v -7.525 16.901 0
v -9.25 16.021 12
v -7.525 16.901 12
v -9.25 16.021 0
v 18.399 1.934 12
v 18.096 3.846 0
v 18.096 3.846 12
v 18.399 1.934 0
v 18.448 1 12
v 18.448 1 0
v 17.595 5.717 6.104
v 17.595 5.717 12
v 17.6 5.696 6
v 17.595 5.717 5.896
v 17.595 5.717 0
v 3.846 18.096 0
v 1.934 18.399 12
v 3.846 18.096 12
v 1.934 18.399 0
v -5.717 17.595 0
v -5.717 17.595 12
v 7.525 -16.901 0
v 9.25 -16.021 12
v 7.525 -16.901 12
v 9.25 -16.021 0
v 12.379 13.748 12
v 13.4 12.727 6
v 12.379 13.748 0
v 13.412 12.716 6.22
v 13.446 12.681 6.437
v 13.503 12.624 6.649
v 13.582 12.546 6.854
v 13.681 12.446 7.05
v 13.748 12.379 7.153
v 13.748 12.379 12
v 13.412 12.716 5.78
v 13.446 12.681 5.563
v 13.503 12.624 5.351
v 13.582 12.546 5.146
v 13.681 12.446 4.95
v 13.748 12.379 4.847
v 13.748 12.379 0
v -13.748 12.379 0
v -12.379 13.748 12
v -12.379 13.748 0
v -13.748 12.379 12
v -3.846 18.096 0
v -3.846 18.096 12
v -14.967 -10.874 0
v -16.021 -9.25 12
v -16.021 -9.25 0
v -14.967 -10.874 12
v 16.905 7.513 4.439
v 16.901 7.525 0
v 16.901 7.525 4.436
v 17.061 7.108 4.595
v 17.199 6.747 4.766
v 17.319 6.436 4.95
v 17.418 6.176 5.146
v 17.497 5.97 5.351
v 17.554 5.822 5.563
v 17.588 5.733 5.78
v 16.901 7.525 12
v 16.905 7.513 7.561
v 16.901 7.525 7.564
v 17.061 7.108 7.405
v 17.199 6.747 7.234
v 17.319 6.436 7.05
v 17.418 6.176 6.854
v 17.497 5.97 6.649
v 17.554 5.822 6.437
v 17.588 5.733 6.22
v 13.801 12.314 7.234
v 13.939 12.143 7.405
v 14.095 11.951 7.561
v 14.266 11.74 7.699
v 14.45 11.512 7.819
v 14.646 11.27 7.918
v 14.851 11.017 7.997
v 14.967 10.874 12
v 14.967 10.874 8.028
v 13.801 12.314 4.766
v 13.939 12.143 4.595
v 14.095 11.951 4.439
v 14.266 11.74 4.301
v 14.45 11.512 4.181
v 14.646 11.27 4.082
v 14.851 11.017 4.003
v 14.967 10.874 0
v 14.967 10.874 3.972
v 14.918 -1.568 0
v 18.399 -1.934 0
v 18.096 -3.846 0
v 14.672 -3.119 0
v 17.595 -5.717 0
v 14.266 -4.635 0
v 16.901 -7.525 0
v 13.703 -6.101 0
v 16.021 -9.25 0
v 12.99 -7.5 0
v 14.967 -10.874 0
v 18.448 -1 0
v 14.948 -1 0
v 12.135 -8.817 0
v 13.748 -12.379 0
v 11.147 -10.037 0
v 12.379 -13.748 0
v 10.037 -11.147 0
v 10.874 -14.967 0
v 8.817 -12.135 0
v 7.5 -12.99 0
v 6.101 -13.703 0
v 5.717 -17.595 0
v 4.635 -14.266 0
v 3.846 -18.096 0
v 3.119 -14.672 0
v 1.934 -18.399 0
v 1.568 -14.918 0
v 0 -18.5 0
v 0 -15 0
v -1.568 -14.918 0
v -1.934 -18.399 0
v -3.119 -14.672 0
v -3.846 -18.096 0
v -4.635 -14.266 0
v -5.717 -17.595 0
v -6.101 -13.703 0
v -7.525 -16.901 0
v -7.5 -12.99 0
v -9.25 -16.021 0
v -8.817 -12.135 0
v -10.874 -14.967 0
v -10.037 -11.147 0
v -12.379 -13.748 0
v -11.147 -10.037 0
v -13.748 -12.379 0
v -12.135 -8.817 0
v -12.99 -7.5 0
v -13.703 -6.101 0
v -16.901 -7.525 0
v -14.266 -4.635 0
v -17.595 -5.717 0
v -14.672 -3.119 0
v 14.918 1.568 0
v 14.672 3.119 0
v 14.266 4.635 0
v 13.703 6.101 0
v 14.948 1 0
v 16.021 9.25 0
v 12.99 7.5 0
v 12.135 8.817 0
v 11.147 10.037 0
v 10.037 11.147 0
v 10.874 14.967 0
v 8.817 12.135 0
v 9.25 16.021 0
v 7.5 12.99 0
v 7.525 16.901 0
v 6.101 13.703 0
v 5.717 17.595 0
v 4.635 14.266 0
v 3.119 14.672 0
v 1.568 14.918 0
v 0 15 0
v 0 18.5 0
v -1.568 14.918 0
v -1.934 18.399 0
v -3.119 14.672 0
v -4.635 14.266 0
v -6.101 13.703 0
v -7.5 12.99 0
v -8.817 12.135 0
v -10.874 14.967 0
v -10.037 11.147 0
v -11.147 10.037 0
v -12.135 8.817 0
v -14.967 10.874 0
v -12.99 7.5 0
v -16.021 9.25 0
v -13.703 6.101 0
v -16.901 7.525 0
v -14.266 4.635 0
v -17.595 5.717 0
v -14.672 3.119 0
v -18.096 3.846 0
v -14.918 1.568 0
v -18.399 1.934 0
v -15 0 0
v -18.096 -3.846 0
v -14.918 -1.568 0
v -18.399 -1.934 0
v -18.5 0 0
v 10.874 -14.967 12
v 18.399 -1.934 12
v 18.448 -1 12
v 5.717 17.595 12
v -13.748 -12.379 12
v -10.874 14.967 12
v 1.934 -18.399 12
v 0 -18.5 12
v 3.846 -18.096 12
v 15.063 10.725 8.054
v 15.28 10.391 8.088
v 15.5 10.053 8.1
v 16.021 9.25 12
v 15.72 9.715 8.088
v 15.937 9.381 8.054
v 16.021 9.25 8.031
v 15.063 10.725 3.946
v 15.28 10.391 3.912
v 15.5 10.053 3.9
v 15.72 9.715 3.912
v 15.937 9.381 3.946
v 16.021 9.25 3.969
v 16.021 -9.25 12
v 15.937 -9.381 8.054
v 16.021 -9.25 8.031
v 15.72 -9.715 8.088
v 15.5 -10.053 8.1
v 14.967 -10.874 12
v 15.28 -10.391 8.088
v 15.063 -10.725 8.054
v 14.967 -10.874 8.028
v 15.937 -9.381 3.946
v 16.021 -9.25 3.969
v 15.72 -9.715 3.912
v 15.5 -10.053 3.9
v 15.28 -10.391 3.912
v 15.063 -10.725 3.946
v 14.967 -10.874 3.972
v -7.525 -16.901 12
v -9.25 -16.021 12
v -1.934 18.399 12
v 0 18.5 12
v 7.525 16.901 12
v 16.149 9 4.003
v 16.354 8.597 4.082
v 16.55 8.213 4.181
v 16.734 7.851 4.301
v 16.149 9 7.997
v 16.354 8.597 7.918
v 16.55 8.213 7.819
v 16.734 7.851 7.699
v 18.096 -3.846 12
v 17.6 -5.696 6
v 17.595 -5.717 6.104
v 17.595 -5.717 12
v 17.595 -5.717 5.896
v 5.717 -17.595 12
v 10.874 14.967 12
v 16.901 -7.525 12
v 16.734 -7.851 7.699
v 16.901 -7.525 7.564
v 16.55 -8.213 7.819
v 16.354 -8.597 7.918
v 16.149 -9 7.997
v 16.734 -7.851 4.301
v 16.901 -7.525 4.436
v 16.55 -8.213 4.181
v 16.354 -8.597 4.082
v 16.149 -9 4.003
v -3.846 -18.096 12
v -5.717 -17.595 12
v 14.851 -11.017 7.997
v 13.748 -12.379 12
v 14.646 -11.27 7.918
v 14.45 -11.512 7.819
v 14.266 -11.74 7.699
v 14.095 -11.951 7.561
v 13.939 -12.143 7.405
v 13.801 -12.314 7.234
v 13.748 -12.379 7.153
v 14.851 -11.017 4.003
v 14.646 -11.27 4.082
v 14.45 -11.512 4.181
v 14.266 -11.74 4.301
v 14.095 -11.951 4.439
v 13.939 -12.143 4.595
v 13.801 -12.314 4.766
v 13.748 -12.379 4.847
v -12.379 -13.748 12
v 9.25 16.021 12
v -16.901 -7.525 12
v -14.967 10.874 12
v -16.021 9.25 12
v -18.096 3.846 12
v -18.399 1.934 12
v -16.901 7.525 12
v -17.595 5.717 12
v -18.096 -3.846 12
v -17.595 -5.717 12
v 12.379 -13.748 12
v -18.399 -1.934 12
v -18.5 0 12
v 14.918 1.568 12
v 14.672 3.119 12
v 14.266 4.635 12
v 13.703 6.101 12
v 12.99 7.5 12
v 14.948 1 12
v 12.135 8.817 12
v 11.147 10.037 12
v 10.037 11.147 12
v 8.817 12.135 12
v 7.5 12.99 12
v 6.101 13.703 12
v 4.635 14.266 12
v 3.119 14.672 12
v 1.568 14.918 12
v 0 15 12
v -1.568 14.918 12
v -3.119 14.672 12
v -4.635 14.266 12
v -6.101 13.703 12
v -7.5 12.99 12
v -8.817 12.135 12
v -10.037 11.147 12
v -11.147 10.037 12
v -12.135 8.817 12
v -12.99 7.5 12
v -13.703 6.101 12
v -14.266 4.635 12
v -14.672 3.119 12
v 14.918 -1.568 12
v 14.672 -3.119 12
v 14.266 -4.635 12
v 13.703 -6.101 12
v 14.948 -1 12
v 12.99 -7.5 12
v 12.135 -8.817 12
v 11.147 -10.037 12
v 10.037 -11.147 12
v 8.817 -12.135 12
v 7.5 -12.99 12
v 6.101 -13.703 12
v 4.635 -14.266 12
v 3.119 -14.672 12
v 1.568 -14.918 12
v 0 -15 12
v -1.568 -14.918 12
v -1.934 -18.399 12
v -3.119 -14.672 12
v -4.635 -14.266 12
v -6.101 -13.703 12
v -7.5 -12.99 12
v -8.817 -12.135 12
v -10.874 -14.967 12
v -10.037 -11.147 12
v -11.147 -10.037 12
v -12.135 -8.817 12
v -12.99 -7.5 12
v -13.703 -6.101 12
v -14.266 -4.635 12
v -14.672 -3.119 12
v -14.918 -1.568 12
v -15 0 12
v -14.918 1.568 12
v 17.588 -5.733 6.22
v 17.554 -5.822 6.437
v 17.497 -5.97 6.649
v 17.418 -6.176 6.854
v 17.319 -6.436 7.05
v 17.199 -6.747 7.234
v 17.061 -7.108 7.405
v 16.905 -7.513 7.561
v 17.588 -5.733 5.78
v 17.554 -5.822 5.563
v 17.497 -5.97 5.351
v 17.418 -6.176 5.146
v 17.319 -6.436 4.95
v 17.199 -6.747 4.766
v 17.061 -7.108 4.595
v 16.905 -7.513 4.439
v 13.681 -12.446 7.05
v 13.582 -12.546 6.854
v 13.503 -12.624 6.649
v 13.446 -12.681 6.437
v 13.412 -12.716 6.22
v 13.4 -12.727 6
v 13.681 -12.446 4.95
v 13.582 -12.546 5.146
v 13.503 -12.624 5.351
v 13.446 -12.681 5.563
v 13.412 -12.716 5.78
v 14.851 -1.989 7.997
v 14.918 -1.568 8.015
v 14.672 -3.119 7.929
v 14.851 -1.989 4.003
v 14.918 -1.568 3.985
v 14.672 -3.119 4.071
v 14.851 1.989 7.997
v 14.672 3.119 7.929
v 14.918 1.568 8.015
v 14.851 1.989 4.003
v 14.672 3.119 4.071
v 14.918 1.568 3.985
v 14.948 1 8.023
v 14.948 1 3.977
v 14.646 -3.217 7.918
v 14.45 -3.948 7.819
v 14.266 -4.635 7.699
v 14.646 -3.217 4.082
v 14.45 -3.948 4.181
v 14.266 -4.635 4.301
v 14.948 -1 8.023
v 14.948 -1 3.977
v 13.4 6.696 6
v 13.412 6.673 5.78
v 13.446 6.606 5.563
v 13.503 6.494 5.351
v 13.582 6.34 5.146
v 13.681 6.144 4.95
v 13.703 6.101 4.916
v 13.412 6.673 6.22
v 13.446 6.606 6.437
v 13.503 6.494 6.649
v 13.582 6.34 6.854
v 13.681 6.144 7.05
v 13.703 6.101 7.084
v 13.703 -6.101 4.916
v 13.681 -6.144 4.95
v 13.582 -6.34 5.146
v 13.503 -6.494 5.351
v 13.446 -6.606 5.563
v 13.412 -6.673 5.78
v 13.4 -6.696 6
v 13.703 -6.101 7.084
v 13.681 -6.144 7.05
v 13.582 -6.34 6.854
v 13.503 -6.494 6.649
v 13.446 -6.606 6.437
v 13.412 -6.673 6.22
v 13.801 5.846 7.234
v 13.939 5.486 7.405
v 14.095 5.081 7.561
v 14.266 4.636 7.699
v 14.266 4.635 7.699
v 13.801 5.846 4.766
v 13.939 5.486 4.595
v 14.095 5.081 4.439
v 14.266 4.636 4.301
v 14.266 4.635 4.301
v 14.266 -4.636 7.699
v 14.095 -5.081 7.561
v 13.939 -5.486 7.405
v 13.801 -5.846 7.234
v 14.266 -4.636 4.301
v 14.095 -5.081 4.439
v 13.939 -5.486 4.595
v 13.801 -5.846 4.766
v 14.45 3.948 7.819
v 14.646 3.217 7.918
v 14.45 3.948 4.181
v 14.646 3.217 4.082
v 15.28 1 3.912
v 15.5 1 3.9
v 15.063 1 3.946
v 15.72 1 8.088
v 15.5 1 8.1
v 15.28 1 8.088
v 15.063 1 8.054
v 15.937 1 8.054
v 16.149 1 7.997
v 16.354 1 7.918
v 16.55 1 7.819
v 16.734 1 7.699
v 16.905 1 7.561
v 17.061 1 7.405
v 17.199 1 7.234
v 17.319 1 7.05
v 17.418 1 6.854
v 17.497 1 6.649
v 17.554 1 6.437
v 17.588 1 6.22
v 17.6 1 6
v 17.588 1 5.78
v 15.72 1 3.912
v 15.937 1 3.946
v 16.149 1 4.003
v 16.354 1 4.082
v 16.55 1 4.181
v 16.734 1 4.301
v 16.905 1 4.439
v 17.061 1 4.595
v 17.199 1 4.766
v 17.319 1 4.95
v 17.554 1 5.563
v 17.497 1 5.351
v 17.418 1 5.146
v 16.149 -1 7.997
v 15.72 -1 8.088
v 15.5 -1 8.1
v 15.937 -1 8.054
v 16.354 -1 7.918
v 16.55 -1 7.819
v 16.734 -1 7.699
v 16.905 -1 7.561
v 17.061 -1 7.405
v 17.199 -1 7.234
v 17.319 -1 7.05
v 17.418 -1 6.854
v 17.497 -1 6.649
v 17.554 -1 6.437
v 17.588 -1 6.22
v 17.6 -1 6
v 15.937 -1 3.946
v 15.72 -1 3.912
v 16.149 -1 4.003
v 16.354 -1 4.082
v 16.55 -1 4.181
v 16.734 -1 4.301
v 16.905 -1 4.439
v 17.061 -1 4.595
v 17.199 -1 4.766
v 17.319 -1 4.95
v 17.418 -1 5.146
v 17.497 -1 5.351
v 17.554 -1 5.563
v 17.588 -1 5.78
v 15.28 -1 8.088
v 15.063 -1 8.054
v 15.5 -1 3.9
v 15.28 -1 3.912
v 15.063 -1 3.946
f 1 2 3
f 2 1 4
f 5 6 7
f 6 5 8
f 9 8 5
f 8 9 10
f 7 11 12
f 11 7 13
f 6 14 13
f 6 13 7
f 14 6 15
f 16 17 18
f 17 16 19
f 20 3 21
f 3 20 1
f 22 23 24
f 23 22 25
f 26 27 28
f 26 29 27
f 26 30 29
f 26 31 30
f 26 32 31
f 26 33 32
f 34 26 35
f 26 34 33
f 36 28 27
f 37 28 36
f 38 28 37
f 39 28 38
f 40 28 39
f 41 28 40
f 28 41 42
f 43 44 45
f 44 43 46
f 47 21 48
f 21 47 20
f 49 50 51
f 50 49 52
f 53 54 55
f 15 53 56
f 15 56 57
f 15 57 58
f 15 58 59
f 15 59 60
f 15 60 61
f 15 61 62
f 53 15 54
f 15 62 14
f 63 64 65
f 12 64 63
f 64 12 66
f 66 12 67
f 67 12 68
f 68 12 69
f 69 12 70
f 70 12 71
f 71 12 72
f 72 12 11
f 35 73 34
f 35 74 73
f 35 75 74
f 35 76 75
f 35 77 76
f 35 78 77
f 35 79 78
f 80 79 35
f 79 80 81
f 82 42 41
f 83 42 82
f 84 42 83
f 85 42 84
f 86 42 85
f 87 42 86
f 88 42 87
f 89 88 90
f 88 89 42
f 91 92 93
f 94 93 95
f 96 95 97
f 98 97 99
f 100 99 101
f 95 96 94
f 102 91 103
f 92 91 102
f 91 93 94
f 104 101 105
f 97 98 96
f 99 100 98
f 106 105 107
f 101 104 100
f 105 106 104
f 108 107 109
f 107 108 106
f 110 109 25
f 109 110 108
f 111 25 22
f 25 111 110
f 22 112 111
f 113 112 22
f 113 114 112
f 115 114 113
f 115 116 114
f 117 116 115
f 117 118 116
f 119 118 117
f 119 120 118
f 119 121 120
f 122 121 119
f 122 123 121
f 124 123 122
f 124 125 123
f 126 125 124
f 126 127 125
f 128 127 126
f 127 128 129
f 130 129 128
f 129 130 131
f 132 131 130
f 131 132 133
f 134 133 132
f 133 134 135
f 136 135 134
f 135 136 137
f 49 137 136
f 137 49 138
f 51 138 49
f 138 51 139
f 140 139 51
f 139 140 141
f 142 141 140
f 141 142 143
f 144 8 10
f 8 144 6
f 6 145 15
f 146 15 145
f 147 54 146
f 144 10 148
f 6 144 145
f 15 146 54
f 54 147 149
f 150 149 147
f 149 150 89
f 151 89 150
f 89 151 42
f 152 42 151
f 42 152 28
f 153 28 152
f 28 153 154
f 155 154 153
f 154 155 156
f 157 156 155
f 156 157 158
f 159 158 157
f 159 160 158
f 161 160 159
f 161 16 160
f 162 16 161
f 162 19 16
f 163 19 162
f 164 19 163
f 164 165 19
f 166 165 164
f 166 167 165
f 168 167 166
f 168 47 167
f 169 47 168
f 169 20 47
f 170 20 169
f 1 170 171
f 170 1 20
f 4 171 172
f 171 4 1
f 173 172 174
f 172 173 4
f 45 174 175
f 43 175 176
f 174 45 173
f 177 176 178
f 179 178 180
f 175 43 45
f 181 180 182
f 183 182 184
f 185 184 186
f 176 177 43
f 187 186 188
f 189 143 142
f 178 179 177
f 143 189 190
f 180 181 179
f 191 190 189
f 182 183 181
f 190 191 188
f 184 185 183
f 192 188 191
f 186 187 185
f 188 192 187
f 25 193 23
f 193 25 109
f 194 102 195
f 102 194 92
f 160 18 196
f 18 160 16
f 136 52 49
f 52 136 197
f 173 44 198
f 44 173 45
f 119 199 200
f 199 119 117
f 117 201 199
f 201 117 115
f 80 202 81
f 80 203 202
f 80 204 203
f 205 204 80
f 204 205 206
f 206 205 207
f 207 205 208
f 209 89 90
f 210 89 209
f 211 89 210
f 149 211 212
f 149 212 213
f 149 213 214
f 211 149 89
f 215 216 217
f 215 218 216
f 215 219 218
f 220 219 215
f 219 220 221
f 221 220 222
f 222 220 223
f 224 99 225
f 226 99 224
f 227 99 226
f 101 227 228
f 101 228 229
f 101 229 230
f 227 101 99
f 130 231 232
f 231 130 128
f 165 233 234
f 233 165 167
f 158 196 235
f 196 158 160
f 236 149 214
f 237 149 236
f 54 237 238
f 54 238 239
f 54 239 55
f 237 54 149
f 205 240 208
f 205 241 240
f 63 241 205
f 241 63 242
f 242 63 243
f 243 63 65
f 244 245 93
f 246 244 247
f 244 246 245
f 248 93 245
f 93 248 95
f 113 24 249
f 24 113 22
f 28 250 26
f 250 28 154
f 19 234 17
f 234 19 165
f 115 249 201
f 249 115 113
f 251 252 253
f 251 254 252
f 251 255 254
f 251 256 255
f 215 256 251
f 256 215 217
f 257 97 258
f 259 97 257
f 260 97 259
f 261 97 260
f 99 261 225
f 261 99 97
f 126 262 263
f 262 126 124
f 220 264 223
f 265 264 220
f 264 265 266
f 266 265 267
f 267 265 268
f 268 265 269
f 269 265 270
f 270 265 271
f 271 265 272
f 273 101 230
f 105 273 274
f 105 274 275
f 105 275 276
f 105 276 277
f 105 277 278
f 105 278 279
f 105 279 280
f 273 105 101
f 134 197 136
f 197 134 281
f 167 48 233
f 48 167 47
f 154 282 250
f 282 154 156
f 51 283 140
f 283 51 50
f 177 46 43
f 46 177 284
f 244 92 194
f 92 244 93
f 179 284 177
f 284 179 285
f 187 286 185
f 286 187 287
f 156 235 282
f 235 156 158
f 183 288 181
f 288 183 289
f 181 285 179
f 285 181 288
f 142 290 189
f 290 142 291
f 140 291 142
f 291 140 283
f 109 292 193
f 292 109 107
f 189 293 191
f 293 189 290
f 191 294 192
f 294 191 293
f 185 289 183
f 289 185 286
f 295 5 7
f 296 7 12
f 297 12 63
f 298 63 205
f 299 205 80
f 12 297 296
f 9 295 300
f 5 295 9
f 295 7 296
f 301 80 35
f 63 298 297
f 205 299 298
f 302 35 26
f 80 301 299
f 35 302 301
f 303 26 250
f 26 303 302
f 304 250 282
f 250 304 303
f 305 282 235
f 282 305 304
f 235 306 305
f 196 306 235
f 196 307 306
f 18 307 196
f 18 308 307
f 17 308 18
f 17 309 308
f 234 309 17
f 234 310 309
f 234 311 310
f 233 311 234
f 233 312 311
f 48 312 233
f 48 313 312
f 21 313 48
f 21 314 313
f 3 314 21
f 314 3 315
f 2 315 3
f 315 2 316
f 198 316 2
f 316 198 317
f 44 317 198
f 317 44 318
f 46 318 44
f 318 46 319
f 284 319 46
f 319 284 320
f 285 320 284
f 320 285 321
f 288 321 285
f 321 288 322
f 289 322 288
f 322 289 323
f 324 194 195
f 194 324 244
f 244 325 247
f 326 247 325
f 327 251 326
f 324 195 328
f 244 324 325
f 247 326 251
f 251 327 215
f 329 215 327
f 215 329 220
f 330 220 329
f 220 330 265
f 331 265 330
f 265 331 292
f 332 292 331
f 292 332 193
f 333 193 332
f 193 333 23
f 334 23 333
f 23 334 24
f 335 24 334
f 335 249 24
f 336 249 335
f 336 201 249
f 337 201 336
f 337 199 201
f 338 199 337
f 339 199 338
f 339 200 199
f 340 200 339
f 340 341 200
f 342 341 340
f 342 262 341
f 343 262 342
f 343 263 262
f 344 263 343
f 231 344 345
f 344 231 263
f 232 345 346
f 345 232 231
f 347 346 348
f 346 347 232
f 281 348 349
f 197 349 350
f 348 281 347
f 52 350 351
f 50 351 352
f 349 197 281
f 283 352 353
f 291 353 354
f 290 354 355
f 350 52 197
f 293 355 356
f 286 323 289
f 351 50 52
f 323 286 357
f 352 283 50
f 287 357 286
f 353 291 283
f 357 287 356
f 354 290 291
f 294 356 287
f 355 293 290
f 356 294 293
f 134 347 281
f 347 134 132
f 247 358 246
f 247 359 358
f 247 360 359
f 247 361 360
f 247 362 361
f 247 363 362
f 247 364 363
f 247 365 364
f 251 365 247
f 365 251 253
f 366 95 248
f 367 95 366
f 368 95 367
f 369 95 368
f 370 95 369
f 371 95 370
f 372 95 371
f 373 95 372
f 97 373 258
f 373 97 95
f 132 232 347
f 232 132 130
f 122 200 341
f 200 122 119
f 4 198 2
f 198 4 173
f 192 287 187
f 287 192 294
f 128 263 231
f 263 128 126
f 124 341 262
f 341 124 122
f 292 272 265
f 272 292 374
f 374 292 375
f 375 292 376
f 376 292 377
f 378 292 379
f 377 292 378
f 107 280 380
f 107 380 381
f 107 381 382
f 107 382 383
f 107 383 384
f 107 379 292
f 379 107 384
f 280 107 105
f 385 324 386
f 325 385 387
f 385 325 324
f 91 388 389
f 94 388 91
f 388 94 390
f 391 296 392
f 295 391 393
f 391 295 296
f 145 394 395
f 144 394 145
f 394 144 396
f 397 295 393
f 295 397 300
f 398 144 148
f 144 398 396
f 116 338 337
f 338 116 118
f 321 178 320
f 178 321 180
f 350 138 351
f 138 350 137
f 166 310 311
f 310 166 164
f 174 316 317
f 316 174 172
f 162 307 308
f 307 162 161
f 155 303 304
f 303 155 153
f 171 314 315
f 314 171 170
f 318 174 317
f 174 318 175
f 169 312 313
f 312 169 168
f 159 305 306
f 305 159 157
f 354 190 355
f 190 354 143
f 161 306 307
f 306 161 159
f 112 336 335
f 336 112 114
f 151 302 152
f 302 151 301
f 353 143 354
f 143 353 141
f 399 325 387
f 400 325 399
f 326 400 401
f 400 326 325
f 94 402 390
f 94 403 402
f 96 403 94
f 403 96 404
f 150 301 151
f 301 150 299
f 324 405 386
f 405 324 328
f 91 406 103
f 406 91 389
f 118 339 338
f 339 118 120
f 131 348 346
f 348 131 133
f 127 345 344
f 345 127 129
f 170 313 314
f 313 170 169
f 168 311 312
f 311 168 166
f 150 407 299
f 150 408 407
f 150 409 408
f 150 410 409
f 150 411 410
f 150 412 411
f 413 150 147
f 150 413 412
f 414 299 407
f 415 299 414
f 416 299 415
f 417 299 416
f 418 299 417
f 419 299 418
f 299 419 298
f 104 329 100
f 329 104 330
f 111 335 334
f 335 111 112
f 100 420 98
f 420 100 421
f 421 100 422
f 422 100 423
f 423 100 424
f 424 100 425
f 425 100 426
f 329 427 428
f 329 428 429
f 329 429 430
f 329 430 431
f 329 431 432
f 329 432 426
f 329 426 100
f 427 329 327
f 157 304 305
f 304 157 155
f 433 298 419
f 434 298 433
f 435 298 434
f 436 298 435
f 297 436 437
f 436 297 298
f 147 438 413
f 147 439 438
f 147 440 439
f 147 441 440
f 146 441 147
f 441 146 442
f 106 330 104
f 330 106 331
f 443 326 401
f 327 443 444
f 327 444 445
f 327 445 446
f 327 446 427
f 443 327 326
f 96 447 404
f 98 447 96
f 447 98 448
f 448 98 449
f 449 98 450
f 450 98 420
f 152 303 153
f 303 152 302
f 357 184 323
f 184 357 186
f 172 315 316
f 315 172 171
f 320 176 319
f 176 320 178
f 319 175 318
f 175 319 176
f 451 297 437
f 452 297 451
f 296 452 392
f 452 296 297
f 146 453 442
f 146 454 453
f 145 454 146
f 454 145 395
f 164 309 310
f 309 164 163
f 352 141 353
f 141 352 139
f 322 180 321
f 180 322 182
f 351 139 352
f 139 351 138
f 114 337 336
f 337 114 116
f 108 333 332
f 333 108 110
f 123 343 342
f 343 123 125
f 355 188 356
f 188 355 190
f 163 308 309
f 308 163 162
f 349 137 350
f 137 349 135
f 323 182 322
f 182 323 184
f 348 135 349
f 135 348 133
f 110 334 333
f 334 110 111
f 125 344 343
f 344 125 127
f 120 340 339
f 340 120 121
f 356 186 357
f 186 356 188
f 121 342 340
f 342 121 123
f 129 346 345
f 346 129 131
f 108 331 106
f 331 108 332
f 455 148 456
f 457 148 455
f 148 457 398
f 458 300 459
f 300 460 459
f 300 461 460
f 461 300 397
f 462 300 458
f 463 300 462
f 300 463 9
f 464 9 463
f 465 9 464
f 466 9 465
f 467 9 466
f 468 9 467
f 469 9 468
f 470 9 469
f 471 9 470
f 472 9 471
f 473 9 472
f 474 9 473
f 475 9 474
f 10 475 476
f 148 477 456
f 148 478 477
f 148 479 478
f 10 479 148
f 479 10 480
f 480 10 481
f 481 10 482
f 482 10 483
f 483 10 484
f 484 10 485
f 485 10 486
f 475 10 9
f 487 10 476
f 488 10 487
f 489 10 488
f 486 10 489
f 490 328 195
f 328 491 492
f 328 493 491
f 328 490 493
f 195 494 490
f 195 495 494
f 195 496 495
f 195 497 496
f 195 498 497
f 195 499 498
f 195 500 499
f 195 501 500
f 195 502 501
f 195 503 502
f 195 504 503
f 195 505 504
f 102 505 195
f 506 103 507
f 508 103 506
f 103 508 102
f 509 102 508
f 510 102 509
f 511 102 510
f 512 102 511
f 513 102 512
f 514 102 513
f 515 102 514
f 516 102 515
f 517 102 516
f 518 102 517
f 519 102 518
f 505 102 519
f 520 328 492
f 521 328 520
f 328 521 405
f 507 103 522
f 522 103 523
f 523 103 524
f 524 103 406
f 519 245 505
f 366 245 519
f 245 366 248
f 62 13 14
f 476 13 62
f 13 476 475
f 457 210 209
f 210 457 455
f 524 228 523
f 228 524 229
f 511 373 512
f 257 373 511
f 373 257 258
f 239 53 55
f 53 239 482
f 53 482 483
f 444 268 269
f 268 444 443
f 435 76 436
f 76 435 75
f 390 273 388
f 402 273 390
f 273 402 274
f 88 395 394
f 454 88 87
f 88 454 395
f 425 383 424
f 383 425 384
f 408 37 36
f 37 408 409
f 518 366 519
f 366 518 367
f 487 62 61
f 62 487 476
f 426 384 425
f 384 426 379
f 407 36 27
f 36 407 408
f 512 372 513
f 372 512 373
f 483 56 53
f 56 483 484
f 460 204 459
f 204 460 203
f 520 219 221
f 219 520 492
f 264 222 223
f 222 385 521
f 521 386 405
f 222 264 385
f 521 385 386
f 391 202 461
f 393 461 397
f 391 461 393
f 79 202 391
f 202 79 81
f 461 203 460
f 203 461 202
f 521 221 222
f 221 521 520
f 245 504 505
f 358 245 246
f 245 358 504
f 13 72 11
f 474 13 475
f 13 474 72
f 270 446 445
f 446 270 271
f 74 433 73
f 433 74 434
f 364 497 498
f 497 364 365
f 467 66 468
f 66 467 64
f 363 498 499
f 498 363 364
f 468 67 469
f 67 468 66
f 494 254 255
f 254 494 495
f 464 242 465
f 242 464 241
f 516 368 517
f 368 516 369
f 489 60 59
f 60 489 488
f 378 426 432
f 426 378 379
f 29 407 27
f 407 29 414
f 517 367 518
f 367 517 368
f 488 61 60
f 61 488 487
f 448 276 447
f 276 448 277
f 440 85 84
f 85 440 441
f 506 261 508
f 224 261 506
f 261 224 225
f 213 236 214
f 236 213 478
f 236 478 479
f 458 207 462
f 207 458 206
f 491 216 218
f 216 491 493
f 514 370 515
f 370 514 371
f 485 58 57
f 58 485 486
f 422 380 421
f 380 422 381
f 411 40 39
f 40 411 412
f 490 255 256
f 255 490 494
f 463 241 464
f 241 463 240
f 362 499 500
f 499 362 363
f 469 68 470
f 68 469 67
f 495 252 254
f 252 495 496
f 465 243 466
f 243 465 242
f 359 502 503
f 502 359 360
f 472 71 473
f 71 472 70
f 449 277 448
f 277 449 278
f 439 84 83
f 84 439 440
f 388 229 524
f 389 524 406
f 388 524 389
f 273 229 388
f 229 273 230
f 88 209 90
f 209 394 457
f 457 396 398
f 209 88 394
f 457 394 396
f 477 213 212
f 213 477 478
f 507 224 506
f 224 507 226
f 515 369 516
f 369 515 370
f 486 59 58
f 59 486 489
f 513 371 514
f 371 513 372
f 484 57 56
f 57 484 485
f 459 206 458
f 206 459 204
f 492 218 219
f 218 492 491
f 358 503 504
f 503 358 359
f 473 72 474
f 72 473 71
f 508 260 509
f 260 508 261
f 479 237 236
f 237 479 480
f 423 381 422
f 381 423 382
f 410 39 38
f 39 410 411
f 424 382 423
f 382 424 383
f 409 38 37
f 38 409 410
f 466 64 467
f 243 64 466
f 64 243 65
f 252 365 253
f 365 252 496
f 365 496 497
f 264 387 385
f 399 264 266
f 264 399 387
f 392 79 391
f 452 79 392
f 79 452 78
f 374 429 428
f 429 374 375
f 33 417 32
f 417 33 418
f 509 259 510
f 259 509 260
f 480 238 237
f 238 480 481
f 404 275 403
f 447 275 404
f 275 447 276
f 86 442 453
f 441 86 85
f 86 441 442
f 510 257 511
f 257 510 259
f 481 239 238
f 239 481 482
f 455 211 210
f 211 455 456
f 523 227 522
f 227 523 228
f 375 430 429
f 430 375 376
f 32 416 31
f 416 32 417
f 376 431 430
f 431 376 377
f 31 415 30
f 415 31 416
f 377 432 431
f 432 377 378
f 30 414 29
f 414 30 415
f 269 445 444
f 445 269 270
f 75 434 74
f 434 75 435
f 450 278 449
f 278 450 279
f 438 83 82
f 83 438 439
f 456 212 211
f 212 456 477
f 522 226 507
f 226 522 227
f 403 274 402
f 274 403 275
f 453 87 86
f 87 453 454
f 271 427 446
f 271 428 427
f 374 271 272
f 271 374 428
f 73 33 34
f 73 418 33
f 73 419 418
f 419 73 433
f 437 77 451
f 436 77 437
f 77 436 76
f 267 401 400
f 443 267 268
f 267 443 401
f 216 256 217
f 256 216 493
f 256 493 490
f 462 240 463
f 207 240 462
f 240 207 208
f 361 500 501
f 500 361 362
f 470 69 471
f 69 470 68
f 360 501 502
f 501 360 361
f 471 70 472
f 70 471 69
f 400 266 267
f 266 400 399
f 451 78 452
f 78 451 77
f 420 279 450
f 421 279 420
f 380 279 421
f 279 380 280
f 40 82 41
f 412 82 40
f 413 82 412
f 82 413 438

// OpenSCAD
// C-style pipe clamp.
$fn = 60;
eps = 0.02;
pipe_d = 30;
wall = 3.5;
outer_d = pipe_d+2*wall;
width = 12;
difference() {
    cylinder(d=outer_d,h=width);
    translate([0,0,-eps]) cylinder(d=pipe_d,h=width+2*eps);
    translate([0,-1,-eps]) cube([outer_d/2+eps,2,width+2*eps]);
    translate([outer_d/2-3,-outer_d/2-eps,width/2]) rotate([-90,0,0]) cylinder(d=4.2,h=outer_d+2*eps);
}
